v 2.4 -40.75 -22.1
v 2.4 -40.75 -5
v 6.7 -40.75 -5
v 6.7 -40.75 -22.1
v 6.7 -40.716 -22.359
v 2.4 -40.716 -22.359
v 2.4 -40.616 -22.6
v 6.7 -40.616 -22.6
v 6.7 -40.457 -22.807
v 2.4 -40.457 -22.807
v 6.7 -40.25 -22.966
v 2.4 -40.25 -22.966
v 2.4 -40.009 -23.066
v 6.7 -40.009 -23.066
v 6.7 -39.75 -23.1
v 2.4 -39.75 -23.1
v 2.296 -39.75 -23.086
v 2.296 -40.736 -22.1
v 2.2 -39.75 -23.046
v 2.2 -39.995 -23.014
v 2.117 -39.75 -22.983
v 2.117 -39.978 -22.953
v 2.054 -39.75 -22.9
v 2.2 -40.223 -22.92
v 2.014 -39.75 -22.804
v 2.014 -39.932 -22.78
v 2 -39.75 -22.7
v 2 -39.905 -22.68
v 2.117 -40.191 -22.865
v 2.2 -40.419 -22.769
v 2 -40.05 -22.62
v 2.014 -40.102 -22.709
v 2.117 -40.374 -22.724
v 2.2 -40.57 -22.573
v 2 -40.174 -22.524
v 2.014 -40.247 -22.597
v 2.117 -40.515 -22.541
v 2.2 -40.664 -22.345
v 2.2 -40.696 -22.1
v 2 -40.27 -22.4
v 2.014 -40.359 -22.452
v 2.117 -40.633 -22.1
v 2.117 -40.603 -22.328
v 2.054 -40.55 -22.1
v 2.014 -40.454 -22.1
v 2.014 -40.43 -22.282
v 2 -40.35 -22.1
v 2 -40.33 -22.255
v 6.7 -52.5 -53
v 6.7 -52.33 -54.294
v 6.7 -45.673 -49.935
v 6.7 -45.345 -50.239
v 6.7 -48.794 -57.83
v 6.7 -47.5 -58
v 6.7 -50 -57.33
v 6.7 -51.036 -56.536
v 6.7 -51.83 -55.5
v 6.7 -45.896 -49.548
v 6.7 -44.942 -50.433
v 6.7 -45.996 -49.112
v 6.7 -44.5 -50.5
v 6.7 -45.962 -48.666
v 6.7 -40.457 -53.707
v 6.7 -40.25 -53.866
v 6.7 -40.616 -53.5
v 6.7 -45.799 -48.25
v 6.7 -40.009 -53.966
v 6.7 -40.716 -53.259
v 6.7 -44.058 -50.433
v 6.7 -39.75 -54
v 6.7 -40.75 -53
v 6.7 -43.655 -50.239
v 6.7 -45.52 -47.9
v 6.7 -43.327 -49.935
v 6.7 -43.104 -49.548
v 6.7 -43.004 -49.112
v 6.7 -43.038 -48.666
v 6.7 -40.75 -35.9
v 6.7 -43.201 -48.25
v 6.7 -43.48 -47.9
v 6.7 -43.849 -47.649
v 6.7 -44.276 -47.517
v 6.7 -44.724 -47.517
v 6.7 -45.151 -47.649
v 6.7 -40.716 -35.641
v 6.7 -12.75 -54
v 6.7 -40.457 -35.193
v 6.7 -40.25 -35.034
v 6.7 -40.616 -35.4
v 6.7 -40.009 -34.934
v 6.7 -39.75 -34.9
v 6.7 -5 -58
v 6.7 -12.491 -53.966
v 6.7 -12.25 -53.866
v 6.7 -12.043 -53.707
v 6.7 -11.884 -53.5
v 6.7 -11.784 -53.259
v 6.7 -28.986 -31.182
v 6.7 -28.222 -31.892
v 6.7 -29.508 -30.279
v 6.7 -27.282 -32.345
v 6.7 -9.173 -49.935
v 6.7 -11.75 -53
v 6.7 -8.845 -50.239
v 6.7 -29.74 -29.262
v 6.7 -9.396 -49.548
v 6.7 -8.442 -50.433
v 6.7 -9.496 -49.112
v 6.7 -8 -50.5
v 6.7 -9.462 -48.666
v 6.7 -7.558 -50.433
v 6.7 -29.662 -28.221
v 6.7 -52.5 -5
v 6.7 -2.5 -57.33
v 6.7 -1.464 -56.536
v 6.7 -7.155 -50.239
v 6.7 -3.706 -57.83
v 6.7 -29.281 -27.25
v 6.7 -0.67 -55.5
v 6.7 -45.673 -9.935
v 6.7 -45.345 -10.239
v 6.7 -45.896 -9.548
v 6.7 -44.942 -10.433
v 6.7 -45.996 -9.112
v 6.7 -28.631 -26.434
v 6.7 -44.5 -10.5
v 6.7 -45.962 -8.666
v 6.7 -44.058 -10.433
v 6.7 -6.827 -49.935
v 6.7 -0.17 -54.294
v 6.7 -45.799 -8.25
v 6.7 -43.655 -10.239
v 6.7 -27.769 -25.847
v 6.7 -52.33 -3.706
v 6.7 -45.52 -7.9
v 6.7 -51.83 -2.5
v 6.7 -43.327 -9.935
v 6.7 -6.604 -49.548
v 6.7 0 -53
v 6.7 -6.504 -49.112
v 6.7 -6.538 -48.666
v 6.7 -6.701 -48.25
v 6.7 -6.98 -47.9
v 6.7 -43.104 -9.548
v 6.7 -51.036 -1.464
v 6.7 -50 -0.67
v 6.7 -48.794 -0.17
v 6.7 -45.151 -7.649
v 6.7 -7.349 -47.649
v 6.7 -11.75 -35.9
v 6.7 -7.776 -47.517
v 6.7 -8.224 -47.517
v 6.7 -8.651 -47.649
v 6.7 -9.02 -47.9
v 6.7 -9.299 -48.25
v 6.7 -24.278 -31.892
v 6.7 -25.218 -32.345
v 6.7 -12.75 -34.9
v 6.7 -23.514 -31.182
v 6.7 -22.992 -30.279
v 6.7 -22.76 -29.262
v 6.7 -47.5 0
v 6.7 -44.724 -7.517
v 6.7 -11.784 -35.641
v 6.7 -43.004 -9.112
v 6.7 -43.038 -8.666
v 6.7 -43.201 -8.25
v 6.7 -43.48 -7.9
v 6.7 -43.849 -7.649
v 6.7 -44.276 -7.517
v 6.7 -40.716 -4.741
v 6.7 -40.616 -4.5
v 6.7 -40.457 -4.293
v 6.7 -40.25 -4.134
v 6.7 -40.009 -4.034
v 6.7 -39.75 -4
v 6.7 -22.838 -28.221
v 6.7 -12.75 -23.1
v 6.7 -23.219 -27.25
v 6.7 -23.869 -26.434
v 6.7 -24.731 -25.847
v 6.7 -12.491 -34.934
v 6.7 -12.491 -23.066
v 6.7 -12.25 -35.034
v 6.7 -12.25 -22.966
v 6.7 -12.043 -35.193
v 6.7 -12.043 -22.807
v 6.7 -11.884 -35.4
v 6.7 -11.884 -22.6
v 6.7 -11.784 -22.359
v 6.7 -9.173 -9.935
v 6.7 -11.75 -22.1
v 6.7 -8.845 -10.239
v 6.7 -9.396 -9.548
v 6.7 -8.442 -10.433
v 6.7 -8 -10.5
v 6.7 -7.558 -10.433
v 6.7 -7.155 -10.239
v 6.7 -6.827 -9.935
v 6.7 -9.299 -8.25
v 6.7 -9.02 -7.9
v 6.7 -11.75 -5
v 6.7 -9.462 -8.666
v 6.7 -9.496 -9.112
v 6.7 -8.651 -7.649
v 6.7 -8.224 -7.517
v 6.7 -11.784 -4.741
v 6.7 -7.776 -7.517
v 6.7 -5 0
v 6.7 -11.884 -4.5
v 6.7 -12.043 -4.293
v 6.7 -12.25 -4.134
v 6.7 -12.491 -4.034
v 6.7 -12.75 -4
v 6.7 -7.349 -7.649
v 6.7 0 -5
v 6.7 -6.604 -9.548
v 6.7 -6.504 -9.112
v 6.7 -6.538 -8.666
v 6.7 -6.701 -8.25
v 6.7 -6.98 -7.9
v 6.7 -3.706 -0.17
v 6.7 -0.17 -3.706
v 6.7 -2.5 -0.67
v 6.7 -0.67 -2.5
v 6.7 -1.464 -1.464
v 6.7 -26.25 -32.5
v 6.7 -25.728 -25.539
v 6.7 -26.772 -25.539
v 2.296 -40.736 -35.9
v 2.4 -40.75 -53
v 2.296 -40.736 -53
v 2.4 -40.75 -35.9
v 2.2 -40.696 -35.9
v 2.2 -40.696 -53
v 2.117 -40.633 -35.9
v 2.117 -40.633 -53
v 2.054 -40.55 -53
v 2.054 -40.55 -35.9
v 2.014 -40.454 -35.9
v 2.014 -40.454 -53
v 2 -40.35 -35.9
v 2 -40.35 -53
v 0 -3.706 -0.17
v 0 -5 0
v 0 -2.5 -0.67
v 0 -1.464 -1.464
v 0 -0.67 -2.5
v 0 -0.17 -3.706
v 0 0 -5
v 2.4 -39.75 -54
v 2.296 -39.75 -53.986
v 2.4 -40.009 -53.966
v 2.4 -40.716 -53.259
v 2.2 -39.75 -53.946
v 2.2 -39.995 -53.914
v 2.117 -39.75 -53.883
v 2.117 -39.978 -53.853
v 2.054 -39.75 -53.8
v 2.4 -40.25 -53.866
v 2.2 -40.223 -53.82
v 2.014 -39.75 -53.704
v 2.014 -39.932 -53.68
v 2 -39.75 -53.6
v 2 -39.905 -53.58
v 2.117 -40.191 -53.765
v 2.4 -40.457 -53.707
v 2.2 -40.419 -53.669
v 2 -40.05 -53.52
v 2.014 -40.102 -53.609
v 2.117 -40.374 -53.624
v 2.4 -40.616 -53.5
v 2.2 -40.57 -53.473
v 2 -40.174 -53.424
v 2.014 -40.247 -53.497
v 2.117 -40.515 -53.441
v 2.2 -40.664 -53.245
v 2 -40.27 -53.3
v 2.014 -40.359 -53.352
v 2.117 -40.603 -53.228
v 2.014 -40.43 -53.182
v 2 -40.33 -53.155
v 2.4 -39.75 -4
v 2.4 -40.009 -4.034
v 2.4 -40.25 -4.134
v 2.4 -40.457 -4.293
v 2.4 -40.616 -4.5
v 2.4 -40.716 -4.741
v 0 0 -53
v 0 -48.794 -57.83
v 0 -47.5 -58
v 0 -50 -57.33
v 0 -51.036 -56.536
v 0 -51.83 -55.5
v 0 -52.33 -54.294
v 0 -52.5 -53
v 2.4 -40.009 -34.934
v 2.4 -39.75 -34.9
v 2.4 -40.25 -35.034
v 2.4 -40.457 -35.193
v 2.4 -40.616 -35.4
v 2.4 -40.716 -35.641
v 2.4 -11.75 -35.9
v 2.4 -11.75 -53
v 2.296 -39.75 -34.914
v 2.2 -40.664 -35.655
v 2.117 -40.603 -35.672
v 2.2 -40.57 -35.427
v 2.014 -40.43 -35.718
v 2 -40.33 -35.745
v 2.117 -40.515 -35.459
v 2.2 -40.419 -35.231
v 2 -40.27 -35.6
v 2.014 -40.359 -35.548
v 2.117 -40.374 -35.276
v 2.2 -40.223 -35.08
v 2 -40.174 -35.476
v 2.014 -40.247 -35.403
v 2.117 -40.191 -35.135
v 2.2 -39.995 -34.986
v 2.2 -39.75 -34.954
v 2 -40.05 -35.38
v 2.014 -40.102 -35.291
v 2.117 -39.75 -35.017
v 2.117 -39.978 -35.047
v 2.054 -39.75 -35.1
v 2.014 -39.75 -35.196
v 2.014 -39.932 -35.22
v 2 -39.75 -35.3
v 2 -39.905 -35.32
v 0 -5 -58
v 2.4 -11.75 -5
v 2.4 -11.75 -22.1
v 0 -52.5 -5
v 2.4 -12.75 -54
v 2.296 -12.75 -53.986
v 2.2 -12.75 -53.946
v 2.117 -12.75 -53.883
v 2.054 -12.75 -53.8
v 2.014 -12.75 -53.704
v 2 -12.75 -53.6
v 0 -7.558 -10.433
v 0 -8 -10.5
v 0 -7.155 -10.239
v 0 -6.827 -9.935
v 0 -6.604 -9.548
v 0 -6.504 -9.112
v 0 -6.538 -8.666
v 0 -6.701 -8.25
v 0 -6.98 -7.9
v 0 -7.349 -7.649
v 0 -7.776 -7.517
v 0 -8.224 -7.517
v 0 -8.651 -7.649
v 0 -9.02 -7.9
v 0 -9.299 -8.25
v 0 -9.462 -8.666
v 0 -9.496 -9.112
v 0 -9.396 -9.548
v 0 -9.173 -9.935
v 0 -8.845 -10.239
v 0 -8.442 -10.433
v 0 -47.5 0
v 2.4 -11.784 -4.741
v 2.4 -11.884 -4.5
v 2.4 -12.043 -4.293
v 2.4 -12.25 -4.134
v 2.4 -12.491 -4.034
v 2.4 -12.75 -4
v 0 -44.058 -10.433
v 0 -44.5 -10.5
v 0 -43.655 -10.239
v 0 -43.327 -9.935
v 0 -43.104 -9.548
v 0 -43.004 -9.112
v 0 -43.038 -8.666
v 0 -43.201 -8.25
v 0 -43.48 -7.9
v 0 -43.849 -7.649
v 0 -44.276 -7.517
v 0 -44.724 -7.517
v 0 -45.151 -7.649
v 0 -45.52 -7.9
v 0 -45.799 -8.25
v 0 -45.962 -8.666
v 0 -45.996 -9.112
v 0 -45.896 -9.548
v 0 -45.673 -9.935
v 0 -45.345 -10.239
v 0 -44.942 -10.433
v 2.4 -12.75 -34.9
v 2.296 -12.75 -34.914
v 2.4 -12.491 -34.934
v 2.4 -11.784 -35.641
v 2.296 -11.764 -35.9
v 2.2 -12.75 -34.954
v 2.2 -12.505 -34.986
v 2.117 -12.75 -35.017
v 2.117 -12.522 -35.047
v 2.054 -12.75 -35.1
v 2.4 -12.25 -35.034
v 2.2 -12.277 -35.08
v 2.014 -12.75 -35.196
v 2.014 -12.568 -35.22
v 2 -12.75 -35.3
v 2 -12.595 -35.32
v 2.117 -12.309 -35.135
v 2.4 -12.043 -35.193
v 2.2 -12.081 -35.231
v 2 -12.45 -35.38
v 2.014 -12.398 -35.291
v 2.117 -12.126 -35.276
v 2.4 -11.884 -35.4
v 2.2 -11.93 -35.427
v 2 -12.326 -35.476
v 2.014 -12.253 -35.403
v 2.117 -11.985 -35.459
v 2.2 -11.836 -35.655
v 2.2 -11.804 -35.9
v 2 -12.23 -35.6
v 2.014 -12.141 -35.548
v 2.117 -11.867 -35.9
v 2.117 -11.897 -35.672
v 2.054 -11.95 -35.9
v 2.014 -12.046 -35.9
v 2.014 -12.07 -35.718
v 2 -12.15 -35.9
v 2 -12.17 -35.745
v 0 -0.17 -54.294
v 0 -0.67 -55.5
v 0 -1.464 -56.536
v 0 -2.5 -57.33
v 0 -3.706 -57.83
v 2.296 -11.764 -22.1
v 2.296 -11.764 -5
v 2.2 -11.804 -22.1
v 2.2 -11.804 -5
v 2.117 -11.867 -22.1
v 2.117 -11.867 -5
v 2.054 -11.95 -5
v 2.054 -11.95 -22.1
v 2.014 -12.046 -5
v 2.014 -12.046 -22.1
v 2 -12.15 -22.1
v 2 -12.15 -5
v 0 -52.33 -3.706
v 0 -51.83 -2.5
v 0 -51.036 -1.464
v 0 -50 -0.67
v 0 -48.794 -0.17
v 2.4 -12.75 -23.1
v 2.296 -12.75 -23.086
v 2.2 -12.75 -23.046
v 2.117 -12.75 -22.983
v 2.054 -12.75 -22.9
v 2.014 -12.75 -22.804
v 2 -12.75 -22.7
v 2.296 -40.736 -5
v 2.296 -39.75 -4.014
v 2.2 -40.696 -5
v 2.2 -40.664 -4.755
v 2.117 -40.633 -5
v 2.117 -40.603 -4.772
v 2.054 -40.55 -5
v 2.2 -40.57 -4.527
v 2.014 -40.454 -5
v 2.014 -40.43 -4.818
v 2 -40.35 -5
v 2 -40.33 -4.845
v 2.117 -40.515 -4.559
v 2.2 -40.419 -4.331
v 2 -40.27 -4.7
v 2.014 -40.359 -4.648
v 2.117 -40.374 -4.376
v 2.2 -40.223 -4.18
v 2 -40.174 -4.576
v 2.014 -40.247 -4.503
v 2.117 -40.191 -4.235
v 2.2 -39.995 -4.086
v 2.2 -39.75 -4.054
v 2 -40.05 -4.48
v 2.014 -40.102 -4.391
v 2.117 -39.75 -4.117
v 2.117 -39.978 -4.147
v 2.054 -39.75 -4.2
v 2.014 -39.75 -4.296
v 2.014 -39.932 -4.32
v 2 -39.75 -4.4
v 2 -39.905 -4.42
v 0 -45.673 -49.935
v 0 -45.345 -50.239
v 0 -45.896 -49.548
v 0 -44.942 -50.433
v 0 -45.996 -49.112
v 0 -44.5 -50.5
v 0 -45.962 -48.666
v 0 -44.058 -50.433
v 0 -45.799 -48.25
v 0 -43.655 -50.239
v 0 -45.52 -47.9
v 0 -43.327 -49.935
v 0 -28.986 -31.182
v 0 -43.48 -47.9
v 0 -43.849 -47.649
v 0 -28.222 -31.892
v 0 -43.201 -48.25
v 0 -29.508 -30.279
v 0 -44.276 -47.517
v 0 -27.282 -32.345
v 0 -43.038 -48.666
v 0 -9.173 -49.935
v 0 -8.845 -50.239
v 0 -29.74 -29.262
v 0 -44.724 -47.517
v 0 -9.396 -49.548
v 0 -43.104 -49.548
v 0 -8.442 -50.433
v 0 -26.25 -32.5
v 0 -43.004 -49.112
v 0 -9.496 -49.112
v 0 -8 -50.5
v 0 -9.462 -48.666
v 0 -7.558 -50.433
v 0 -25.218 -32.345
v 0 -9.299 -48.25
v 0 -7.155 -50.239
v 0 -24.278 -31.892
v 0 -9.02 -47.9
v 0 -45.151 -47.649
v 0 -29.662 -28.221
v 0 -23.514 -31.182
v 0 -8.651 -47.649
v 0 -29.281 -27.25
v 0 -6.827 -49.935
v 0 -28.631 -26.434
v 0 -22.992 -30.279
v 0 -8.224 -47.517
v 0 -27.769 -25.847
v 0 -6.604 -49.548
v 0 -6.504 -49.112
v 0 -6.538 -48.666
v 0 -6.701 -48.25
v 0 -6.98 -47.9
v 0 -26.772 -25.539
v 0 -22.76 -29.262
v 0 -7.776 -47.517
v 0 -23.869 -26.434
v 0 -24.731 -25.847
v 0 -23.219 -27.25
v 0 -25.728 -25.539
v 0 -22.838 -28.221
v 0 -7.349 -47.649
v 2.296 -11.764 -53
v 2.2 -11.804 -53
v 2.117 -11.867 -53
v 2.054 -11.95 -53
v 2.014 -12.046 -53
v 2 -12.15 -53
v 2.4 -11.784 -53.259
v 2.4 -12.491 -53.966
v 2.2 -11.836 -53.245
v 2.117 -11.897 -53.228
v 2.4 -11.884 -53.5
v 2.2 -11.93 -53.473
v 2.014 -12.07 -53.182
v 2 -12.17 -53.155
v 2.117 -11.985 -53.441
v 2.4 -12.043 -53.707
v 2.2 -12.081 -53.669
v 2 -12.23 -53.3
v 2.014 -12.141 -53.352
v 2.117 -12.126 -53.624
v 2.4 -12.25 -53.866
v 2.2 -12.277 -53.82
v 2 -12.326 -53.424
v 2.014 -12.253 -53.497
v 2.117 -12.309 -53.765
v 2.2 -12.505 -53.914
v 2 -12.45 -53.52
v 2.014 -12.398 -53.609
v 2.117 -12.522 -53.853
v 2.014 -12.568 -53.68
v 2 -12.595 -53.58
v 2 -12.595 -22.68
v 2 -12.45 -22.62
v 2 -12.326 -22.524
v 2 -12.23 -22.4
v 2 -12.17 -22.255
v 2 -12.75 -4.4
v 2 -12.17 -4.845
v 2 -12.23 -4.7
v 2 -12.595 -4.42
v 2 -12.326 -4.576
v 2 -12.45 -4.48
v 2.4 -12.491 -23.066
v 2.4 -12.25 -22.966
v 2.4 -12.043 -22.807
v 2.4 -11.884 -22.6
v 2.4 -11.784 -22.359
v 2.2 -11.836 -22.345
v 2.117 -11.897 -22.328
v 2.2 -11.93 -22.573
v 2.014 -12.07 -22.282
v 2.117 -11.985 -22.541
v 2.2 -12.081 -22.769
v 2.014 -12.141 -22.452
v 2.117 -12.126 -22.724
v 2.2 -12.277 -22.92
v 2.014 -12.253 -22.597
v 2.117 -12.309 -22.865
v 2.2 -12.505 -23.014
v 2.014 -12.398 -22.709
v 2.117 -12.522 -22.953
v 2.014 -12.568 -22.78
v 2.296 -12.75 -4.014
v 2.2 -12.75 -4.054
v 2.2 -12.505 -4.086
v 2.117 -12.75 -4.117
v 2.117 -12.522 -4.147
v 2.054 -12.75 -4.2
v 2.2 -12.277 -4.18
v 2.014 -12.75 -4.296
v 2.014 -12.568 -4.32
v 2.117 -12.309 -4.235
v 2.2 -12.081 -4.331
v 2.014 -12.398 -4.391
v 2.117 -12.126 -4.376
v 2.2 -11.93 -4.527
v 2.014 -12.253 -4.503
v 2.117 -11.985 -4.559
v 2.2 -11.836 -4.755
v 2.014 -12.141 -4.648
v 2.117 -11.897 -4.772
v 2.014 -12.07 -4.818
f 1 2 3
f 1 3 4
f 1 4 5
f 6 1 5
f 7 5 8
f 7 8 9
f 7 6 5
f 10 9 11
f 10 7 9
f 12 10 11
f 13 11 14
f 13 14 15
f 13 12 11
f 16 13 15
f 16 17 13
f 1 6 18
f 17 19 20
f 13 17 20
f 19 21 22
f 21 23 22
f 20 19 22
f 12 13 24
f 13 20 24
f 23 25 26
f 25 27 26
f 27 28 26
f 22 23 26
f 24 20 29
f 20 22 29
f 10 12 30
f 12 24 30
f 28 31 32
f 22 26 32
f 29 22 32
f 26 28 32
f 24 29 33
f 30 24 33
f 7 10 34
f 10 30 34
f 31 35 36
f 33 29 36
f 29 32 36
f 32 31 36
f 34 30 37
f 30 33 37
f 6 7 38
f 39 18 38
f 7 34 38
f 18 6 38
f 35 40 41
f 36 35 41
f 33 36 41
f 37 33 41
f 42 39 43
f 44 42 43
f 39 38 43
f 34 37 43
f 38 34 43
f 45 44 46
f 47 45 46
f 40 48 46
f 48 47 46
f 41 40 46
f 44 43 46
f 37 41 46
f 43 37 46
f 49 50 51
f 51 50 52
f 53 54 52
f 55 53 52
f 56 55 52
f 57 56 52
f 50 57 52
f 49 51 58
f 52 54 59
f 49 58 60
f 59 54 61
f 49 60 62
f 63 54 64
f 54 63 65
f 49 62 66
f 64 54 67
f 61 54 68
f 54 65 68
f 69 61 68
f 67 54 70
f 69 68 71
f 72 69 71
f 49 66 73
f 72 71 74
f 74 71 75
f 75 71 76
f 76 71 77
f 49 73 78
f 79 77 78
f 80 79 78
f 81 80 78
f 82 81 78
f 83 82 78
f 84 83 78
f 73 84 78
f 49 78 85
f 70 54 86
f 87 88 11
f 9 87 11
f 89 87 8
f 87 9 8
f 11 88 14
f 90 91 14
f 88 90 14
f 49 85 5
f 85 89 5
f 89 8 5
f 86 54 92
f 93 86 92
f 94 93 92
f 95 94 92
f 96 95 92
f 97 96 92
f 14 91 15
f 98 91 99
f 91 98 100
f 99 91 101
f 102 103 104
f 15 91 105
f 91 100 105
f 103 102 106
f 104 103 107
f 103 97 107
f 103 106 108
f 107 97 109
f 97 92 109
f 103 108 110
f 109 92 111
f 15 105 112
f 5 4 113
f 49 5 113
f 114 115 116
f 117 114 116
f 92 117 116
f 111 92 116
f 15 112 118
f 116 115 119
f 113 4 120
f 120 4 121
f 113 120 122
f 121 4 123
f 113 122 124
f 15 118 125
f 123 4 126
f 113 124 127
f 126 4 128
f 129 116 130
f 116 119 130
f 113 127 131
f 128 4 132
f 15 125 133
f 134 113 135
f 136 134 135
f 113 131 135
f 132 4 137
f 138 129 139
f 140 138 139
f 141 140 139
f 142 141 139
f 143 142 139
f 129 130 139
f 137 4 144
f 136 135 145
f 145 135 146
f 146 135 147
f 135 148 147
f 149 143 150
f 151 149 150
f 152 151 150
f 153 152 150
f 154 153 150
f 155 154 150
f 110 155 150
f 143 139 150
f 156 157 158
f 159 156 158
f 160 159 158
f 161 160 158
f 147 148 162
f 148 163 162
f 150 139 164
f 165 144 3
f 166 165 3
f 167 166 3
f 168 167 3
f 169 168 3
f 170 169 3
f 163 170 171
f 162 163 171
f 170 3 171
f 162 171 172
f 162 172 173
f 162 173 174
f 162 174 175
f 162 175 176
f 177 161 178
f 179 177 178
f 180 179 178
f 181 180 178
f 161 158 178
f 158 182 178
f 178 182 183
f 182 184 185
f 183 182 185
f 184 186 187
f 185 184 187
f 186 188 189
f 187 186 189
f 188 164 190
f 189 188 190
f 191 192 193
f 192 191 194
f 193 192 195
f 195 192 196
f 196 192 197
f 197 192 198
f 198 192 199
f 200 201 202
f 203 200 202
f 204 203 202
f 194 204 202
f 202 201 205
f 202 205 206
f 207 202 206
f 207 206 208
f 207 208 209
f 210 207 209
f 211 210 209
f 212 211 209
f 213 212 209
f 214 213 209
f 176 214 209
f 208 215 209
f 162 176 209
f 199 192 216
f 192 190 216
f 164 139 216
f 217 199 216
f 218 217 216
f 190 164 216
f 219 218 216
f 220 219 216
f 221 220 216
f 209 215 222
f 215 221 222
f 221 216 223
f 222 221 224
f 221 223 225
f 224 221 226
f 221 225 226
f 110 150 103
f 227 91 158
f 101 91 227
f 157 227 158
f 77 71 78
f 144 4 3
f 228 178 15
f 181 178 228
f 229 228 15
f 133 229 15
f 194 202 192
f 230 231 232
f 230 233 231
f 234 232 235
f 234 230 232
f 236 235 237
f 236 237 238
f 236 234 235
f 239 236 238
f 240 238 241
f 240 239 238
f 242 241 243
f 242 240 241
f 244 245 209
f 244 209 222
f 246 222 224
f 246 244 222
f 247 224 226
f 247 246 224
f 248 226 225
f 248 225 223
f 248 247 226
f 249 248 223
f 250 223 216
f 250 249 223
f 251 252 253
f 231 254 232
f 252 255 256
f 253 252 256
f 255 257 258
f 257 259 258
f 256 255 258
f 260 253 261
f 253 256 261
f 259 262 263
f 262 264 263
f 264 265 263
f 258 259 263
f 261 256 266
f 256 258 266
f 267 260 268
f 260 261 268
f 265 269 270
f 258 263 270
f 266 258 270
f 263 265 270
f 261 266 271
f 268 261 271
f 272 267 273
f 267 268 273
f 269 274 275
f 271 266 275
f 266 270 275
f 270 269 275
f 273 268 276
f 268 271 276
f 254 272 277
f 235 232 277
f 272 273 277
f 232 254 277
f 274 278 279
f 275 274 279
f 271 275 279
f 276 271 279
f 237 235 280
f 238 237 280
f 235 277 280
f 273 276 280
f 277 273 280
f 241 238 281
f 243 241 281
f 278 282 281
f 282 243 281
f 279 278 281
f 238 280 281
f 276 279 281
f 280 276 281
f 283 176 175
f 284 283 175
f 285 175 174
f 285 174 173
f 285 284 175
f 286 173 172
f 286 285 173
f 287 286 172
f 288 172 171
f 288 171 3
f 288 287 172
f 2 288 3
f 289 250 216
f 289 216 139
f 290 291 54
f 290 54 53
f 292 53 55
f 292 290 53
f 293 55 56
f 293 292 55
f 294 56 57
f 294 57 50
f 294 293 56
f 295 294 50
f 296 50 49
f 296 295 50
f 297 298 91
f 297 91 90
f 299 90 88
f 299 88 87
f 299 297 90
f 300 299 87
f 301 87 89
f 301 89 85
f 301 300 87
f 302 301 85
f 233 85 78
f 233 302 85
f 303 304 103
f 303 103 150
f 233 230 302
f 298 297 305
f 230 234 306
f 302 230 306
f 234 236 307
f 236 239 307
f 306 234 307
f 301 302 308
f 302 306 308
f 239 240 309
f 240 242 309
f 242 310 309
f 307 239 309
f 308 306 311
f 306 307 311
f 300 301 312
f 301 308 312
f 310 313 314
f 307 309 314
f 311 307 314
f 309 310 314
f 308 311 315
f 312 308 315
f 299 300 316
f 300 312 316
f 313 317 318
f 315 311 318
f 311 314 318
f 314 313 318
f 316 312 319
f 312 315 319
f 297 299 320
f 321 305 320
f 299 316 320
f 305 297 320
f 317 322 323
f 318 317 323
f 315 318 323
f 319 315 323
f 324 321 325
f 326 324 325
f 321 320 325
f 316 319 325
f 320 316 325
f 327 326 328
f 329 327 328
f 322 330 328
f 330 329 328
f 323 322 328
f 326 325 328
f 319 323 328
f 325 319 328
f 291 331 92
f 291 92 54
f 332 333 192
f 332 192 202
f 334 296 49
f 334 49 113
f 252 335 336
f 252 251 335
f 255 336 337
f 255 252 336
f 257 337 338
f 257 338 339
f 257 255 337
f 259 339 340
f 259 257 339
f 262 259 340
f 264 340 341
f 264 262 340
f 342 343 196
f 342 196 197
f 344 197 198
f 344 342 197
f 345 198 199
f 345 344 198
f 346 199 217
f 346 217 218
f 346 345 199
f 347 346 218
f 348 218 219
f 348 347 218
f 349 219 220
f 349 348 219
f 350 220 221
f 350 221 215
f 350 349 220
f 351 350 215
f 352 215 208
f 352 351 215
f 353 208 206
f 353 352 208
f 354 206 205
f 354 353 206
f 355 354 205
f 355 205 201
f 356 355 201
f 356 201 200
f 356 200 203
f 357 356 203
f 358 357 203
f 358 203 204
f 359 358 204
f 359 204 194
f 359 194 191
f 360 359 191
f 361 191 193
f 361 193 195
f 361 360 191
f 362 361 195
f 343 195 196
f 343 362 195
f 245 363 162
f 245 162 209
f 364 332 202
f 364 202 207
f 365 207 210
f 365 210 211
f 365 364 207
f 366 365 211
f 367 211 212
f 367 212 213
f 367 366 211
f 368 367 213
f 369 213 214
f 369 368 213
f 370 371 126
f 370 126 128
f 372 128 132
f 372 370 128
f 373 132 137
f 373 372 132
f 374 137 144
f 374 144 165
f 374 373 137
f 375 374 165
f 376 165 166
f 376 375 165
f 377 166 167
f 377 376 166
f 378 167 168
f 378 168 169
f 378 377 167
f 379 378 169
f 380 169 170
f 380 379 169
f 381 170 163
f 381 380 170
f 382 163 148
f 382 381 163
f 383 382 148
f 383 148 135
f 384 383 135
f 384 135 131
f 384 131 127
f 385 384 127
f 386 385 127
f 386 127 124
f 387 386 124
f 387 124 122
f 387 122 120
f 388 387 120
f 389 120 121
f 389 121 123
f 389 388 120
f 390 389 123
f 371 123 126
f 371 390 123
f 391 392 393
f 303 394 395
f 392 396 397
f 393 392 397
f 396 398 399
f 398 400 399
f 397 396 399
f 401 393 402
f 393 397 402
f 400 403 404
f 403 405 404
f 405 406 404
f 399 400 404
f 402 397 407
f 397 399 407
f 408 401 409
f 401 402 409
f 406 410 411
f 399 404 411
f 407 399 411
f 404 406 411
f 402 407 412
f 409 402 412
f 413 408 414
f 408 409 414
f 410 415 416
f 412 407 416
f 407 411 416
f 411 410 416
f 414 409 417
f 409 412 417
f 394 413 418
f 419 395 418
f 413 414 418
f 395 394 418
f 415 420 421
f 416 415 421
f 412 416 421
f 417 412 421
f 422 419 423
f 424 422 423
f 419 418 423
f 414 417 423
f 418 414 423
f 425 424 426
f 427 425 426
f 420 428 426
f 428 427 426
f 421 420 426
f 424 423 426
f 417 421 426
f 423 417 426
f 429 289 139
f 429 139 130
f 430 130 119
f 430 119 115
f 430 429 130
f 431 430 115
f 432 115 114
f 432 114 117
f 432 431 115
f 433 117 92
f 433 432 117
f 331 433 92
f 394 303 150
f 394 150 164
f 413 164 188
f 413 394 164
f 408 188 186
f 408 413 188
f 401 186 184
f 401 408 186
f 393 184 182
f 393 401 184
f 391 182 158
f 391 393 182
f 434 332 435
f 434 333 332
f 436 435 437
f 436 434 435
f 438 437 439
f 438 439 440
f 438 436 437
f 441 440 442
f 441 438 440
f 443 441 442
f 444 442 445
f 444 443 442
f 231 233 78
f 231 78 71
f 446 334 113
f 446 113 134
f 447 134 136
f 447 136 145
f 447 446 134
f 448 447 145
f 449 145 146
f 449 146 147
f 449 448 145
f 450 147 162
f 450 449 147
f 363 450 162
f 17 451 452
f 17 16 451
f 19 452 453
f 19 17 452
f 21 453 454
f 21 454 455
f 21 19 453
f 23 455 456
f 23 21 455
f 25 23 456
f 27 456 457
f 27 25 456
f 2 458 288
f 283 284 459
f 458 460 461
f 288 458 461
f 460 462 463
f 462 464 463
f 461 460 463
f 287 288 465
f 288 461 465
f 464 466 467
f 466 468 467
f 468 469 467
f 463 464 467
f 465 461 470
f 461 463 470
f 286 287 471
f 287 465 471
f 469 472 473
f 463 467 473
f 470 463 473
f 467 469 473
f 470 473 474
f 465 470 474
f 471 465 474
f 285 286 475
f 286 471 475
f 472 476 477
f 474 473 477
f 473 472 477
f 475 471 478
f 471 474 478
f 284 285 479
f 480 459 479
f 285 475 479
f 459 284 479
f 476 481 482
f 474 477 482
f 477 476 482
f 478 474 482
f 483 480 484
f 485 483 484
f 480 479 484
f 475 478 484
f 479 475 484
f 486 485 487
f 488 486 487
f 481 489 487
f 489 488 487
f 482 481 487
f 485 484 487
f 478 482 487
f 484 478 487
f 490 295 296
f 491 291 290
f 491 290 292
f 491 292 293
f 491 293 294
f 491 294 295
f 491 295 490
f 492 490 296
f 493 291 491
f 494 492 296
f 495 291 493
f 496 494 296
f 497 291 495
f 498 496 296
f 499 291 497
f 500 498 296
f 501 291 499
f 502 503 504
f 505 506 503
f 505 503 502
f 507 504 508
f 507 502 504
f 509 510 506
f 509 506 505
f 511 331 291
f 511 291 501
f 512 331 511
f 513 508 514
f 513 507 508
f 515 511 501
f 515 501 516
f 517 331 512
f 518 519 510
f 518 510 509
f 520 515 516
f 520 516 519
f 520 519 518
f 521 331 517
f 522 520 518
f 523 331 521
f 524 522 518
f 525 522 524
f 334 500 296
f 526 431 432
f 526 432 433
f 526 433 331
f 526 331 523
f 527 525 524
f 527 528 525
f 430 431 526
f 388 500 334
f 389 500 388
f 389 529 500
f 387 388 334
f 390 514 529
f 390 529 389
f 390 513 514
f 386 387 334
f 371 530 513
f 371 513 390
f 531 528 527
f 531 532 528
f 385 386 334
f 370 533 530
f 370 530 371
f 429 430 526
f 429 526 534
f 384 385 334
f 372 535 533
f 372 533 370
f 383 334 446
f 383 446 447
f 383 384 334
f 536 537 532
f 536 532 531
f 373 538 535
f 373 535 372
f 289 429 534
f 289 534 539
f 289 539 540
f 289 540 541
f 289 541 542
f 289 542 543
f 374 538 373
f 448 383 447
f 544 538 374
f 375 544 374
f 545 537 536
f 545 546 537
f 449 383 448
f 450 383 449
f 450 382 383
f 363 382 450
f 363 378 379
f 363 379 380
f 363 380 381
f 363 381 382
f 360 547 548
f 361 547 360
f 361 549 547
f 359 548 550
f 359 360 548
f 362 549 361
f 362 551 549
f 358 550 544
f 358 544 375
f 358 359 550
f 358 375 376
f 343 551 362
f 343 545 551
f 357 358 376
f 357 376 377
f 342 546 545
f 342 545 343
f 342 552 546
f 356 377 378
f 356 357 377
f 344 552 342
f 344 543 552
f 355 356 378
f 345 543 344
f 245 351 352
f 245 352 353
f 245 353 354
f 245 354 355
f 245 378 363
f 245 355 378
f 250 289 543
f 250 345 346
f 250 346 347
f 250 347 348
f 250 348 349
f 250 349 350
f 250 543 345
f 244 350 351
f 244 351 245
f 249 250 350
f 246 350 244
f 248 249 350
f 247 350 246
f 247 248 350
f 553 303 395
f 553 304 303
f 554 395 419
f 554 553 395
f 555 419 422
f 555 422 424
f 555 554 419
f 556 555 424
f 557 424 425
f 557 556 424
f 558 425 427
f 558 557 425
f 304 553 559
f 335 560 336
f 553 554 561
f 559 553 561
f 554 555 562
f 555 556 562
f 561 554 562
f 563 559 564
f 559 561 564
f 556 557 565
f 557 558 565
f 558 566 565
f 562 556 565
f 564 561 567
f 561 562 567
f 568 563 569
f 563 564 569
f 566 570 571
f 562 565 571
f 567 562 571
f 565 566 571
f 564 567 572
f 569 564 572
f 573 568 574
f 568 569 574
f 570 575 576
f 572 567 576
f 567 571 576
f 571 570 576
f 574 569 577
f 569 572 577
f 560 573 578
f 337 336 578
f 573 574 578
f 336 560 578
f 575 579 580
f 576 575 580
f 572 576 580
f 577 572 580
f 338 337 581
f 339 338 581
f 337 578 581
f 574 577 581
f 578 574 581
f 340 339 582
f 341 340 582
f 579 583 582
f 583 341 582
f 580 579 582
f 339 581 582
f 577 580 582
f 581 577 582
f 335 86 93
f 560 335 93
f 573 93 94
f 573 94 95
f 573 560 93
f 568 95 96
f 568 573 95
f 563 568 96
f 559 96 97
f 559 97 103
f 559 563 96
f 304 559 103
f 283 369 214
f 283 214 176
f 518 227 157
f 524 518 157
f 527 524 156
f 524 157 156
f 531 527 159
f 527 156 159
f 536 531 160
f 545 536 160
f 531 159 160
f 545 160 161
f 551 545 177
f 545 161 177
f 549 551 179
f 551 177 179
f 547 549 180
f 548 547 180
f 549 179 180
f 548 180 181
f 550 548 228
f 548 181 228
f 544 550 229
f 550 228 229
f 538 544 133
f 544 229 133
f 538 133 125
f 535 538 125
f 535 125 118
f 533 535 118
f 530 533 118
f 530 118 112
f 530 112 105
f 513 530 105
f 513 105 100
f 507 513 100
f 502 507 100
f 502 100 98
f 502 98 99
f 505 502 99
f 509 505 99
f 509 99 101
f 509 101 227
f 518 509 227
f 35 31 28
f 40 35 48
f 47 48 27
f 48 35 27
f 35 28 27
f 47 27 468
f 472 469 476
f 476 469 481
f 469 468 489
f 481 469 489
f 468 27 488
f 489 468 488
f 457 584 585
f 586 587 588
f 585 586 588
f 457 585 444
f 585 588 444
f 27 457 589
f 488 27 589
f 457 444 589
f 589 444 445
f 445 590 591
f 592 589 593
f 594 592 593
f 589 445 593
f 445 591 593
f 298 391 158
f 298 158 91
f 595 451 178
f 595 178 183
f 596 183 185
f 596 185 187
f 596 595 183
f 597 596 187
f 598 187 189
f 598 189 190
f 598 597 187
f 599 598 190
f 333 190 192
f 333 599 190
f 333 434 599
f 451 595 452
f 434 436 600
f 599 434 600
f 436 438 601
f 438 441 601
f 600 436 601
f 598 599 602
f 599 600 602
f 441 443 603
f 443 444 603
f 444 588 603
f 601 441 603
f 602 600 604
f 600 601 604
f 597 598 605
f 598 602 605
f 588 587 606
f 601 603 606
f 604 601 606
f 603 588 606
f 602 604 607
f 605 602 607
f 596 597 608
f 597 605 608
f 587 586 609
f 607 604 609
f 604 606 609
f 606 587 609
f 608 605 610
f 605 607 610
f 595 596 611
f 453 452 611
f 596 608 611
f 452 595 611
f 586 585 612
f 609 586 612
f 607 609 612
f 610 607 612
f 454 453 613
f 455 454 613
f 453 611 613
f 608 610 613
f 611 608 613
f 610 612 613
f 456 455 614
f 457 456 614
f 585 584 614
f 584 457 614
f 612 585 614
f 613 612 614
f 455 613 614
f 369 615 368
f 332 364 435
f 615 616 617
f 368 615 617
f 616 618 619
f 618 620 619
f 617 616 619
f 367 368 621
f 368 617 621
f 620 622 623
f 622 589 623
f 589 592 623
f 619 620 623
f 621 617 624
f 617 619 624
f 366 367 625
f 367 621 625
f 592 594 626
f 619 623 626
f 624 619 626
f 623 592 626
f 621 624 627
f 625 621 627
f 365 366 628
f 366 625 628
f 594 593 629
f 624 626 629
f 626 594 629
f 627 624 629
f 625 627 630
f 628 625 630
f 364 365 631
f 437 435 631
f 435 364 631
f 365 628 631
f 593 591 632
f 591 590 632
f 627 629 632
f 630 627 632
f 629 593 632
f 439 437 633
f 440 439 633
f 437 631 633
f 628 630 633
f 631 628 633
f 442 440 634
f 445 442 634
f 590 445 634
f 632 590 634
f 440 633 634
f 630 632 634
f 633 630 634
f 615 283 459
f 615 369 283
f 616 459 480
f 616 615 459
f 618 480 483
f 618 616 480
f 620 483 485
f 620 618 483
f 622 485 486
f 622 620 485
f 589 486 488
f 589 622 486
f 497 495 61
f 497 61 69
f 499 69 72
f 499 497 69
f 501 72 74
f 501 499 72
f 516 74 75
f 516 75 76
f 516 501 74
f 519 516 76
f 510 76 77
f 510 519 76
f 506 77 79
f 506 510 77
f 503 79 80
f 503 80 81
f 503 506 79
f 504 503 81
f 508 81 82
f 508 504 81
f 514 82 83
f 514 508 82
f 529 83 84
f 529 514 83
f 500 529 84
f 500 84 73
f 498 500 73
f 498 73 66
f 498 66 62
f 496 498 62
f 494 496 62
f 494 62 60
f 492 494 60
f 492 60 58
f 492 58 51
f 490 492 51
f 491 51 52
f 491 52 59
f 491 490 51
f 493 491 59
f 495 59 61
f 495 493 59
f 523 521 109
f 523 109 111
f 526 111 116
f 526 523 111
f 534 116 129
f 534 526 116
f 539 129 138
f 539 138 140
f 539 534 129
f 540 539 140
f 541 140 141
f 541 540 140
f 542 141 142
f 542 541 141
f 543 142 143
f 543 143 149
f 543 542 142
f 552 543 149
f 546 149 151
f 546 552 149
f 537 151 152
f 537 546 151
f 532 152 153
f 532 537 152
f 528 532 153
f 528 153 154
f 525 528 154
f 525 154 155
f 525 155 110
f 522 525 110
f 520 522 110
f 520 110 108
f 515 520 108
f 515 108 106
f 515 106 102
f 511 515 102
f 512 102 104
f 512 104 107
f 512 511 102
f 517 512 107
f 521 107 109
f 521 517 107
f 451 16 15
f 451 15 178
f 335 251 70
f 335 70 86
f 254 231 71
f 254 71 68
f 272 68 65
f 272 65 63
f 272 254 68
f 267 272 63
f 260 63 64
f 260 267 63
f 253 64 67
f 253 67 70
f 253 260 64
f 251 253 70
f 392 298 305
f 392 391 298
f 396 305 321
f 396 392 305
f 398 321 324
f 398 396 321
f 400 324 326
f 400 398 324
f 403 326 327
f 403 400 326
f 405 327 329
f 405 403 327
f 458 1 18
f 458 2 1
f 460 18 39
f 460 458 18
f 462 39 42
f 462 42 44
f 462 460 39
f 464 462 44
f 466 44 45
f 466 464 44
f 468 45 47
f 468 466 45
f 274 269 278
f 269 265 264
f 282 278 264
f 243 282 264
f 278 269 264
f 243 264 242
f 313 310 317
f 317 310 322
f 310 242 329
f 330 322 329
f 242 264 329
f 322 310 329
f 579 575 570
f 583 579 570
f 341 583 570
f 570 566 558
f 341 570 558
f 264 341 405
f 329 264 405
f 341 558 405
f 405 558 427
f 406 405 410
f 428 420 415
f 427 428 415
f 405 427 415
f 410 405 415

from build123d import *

# Parameters (mm, degrees)
SKETCH_1_R          = 1.5
EXTRUDE_1_DEPTH     = 6.7
SKETCH_2_W          = 19.1
SKETCH_2_H          = 29
EXTRUDE_2_DEPTH     = 2
CUT_EXTRUDE_1_REACH = 80.518
SKETCH_3_R          = 3.5
FILLET_1_R          = 0.4


with BuildPart() as part:
    # 草图1 → 凸台-拉伸1 (new body)
    with BuildSketch(Plane(origin=(0, 0, 0), x_dir=(0, 0, -1), z_dir=(1, 0, 0))):
        with BuildLine():
            Line((5, 0), (53, 0))
            ThreePointArc((53, 0), (56.535533906, -1.464466094), (58, -5))
            Line((58, -5), (58, -47.5))
            ThreePointArc((58, -47.5), (56.535533906, -51.035533906), (53, -52.5))
            Line((53, -52.5), (5, -52.5))
            ThreePointArc((5, -52.5), (1.464466094, -51.035533906), (0, -47.5))
            Line((0, -47.5), (0, -5))
            ThreePointArc((0, -5), (1.464466094, -1.464466094), (5, 0))
        make_face()
        with Locations((9, -8)):
            Circle(SKETCH_1_R, mode=Mode.SUBTRACT)
        with Locations((49, -8)):
            Circle(SKETCH_1_R, mode=Mode.SUBTRACT)
        with Locations((49, -44.5)):
            Circle(SKETCH_1_R, mode=Mode.SUBTRACT)
        with Locations((9, -44.5)):
            Circle(SKETCH_1_R, mode=Mode.SUBTRACT)
        with BuildLine():
            Line((5, -40.75), (22.1, -40.75))
            ThreePointArc((22.1, -40.75), (22.807106781, -40.457106781), (23.1, -39.75))
            Line((23.1, -39.75), (23.1, -12.75))
            ThreePointArc((23.1, -12.75), (22.807106781, -12.042893219), (22.1, -11.75))
            Line((22.1, -11.75), (5, -11.75))
            ThreePointArc((5, -11.75), (4.292893219, -12.042893219), (4, -12.75))
            Line((4, -12.75), (4, -39.75))
            ThreePointArc((4, -39.75), (4.292893219, -40.457106781), (5, -40.75))
        make_face(mode=Mode.SUBTRACT)
        with BuildLine():
            Line((53, -11.75), (35.9, -11.75))
            ThreePointArc((35.9, -11.75), (35.192893219, -12.042893219), (34.9, -12.75))
            Line((34.9, -12.75), (34.9, -39.75))
            ThreePointArc((34.9, -39.75), (35.192893219, -40.457106781), (35.9, -40.75))
            Line((35.9, -40.75), (53, -40.75))
            ThreePointArc((53, -40.75), (53.707106781, -40.457106781), (54, -39.75))
            Line((54, -39.75), (54, -12.75))
            ThreePointArc((54, -12.75), (53.707106781, -12.042893219), (53, -11.75))
        make_face(mode=Mode.SUBTRACT)
    extrude(amount=EXTRUDE_1_DEPTH)

    # 草图2 → 凸台-拉伸2 (add)
    with BuildSketch(Plane.ZY):
        with Locations((-13.55, -26.25)):
            Rectangle(SKETCH_2_W, SKETCH_2_H)
        with Locations((-44.45, -26.25)):
            Rectangle(SKETCH_2_W, SKETCH_2_H)
    extrude(amount=-EXTRUDE_2_DEPTH)

    # 草图3 → 切除-拉伸1 (cut, up to next)
    with BuildSketch(Plane(origin=(6.7, 0, 0), x_dir=(0, 0, -1), z_dir=(1, 0, 0)), mode=Mode.PRIVATE) as cut_extrude_1_sk1:
        with Locations((29, -26.25)):
            Circle(SKETCH_3_R)
    cut_extrude_1_tool1 = extrude(cut_extrude_1_sk1.sketch, amount=-CUT_EXTRUDE_1_REACH, mode=Mode.PRIVATE) & part.part
    add(cut_extrude_1_tool1.solids().sort_by_distance((6.7, -26.25, -29))[0], mode=Mode.SUBTRACT)

    # 圆角1
    fillet_1_edges = [part.edges().sort_by_distance(p)[0] for p in [
        (2, -26.25, -4),
        (2, -40.75, -13.55),
        (2, -26.25, -23.1),
        (2, -12.042893219, -4.292893219),
        (2, -40.457106781, -4.292893219),
        (2, -40.457106781, -22.807106781),
        (2, -12.042893219, -22.807106781),
        (2, -26.25, -34.9),
        (2, -40.75, -44.45),
        (2, -26.25, -54),
        (2, -11.75, -44.45),
        (2, -40.457106781, -35.192893219),
        (2, -40.457106781, -53.707106781),
        (2, -12.042893219, -53.707106781),
        (2, -12.042893219, -35.192893219),
        (2, -11.75, -13.55),
    ]]
    fillet(fillet_1_edges, radius=FILLET_1_R)


solid = part.part
